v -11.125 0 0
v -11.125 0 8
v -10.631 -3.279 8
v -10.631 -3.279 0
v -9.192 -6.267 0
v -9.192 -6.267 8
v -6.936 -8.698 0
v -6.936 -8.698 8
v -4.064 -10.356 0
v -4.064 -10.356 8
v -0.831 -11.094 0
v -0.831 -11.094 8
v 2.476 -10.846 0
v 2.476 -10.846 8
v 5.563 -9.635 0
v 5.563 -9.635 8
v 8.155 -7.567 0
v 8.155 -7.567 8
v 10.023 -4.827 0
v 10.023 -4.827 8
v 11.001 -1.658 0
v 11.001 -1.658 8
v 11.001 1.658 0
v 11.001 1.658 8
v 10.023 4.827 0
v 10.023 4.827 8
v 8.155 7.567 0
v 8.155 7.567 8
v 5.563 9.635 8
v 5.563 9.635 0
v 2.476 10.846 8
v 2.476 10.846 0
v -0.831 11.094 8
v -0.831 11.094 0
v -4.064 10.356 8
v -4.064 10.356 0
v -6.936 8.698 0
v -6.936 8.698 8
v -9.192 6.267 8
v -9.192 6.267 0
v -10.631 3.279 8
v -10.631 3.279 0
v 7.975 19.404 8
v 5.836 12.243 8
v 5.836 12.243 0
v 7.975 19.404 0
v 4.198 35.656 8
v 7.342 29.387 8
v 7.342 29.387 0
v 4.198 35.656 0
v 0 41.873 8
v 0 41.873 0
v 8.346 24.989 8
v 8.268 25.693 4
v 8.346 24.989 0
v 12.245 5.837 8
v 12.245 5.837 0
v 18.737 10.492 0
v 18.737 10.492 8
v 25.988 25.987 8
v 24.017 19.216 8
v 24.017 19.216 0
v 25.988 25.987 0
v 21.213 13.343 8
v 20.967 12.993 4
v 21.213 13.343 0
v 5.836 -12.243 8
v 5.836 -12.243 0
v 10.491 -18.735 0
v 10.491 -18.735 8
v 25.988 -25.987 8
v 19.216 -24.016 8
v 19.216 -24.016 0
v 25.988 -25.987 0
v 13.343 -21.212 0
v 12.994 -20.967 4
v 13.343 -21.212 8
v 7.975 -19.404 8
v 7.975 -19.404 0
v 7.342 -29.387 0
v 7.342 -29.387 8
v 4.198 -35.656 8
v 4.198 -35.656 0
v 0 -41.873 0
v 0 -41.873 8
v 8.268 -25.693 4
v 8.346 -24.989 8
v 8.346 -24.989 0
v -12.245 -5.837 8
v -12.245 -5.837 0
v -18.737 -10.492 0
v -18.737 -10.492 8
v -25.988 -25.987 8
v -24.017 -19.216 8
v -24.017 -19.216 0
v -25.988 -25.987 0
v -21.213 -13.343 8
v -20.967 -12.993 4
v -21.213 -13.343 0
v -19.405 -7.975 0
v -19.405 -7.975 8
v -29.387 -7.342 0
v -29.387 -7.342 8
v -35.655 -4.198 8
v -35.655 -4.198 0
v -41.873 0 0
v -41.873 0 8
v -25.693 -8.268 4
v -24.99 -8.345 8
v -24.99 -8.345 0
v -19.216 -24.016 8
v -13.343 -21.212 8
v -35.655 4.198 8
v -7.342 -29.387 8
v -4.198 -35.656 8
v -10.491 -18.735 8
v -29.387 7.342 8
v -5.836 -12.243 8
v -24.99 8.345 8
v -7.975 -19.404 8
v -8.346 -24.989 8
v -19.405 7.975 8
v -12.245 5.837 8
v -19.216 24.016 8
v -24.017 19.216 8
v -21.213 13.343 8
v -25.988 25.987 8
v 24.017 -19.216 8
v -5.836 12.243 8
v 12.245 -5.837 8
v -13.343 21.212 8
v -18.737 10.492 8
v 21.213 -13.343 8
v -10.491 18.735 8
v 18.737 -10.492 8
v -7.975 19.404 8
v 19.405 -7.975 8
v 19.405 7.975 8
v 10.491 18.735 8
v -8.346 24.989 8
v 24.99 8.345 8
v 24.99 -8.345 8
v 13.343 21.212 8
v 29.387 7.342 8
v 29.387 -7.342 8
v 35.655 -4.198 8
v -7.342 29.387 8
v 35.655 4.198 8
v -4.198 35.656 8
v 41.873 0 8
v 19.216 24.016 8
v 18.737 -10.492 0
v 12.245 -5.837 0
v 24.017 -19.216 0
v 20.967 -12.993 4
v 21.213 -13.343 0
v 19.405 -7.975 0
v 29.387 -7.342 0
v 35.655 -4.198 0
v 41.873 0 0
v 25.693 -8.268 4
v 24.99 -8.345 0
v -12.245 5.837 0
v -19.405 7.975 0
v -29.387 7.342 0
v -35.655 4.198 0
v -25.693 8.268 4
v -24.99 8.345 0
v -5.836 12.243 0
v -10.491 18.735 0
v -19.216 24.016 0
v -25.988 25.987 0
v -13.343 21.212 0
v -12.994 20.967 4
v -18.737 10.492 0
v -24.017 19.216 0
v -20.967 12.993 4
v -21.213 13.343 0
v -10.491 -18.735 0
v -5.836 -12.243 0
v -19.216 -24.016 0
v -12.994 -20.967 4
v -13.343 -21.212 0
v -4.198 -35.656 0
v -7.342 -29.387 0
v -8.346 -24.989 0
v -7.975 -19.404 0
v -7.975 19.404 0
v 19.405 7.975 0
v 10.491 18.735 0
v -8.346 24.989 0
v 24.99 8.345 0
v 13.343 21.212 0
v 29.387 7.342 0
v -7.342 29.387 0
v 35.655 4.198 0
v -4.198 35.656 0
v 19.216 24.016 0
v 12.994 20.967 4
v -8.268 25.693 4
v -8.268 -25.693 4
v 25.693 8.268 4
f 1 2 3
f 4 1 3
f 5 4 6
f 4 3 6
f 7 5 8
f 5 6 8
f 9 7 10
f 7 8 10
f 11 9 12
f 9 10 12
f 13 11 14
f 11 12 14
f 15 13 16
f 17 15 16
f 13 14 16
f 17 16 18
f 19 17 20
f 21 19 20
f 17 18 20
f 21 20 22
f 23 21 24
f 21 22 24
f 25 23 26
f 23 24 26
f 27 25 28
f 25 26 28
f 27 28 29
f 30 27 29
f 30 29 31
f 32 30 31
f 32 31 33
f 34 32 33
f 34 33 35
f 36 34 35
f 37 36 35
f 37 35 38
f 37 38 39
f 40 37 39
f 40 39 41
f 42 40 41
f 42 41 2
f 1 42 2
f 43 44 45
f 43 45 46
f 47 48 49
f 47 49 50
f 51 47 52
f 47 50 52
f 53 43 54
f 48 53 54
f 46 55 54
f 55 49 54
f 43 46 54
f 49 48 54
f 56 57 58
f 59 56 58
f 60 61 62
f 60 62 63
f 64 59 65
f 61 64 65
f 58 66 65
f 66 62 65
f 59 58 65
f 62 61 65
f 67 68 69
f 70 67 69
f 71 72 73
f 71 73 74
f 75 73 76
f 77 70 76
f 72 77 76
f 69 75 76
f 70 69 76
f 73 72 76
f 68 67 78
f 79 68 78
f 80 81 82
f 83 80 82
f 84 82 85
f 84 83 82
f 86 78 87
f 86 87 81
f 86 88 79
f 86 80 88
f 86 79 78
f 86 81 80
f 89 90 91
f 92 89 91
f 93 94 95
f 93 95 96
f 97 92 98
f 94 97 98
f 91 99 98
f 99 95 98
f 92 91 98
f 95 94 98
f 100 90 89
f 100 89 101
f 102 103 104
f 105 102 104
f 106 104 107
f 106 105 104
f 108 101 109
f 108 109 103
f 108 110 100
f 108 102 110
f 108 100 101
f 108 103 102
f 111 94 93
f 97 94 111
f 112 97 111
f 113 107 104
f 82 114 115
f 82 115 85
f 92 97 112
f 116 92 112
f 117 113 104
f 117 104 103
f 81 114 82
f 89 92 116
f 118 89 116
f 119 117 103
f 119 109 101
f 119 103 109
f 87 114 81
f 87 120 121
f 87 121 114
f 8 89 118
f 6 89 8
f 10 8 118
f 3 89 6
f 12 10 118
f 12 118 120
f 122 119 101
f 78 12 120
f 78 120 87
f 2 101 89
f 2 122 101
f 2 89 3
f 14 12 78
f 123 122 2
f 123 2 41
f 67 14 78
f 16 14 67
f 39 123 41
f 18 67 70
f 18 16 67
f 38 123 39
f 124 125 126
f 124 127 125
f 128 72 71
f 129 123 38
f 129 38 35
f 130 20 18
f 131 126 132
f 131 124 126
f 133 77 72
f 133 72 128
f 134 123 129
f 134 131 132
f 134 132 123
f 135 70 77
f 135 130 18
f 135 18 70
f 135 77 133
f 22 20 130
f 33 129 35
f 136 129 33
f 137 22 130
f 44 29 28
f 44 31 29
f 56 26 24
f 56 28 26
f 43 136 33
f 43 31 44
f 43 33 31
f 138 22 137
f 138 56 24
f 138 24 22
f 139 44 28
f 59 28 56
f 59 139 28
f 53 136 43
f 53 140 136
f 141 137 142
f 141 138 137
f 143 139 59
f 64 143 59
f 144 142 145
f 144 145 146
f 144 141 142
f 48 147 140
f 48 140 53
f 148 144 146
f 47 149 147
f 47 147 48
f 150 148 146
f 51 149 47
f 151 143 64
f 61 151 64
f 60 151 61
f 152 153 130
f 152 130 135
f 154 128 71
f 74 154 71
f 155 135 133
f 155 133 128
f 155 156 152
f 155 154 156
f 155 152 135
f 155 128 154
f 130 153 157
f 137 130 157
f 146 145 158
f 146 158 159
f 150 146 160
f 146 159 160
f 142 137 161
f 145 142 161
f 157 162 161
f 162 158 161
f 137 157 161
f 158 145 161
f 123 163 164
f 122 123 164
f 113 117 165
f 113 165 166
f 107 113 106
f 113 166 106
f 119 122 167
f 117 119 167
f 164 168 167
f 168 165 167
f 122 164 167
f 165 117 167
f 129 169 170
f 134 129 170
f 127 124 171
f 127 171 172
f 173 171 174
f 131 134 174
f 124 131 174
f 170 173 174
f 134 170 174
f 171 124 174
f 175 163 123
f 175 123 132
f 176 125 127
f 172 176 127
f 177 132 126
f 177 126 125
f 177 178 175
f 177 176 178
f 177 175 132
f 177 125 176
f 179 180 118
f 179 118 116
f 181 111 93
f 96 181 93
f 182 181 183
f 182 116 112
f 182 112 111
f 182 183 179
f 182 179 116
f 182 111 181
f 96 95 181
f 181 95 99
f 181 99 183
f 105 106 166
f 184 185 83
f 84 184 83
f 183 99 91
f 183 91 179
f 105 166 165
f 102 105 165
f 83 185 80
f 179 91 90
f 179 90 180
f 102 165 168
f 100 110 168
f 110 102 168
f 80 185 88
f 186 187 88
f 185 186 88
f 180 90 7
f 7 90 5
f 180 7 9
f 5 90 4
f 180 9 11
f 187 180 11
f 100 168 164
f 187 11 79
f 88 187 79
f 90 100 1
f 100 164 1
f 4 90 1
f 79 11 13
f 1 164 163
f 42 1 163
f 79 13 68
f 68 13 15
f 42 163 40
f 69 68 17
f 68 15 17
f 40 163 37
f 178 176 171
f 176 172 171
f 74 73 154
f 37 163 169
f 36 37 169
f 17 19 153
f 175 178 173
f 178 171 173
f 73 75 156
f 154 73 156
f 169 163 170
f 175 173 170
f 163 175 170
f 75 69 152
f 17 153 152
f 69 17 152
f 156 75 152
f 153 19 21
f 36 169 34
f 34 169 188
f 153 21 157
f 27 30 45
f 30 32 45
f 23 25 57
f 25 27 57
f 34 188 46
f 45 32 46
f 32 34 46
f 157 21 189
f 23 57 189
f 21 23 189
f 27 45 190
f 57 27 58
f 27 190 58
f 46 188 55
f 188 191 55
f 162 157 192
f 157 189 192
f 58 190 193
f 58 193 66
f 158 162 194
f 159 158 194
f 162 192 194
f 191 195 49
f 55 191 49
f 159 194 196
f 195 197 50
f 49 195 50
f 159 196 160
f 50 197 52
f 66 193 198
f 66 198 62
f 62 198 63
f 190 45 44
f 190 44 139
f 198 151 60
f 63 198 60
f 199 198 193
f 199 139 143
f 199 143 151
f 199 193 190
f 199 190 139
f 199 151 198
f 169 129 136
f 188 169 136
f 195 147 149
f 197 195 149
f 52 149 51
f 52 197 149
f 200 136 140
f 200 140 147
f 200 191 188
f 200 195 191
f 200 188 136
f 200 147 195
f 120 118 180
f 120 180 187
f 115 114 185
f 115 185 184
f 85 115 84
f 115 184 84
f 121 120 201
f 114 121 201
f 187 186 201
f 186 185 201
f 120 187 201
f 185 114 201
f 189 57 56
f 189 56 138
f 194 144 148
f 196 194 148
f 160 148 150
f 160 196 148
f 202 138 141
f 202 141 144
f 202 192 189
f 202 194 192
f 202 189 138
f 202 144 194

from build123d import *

# Parameters (mm, degrees)
F1_DEPTH = 8
F3_D     = 22.25


with BuildPart() as f1:
    # F0 (on Top) → F1 (new body)
    with BuildSketch(Plane.XY):
        with BuildLine():
            ThreePointArc((9.9471375726, 4.9819754226), (7.8665088435, 7.8666170375), (4.9818386126, 9.9472060921))
            ThreePointArc((4.9818386126, 9.9472060921), (0, 11.125), (-4.9818386126, 9.9472060921))
            ThreePointArc((-4.9818386126, 9.9472060921), (-7.8665088435, 7.8666170375), (-9.9471375726, 4.9819754226))
            ThreePointArc((-9.9471375726, 4.9819754226), (-11.125, 0), (-9.9471375726, -4.9819754226))
            ThreePointArc((-9.9471375726, -4.9819754226), (-7.8665088435, -7.8666170375), (-4.9818386126, -9.9472060921))
            ThreePointArc((-4.9818386126, -9.9472060921), (0, -11.125), (4.9818386126, -9.9472060921))
            ThreePointArc((4.9818386126, -9.9472060921), (7.8665088435, -7.8666170375), (9.9471375726, -4.9819754226))
            ThreePointArc((9.9471375726, -4.9819754226), (10.8265306192, -2.5596600853), (11.125, 0))
            ThreePointArc((11.125, 0), (10.8265306192, 2.5596600853), (9.9471375726, 4.9819754226))
        make_face()
        with BuildLine():
            add(Edge.make_bspline(
                [(4.9818386126, 9.9472060921), (5.2692870464, 10.7123686961), (5.5568645372, 11.4776931218), (5.8364125218, 12.242766493)],
                knots=[0, 0, 0, 0, 0.0701678859, 0.0701678859, 0.0701678859, 0.0701678859], degree=3))
            ThreePointArc((4.9818386126, 9.9472060921), (7.8665088435, 7.8666170375), (9.9471375726, 4.9819754226))
            add(Edge.make_bspline(
                [(9.9471375726, 4.9819754226), (10.7123016854, 5.2694244447), (11.4776275551, 5.5570012299), (12.2427023029, 5.8365471685)],
                knots=[1.11321e-05, 1.11321e-05, 1.11321e-05, 1.11321e-05, 0.0701791516, 0.0701791516, 0.0701791516, 0.0701791516], degree=3))
            ThreePointArc((12.2427023029, 5.8365471685), (9.5902820459, 9.5903875212), (5.8364125218, 12.242766493))
        make_face()
        with BuildLine():
            ThreePointArc((-4.9818386126, 9.9472060921), (0, 11.125), (4.9818386126, 9.9472060921))
            add(Edge.make_bspline(
                [(4.9818386126, 9.9472060921), (5.2692870464, 10.7123686961), (5.5568645372, 11.4776931218), (5.8364125218, 12.242766493)],
                knots=[0, 0, 0, 0, 0.0701678859, 0.0701678859, 0.0701678859, 0.0701678859], degree=3))
            ThreePointArc((5.8364125218, 12.242766493), (0, 13.5627815188), (-5.8364125218, 12.242766493))
            add(Edge.make_bspline(
                [(-4.9818386126, 9.9472060921), (-5.2692870464, 10.7123686961), (-5.5568645372, 11.4776931218), (-5.8364125218, 12.242766493)],
                knots=[0, 0, 0, 0, 0.0701678859, 0.0701678859, 0.0701678859, 0.0701678859], degree=3))
        make_face()
        with BuildLine():
            ThreePointArc((-9.9471375726, 4.9819754226), (-7.8665088435, 7.8666170375), (-4.9818386126, 9.9472060921))
            add(Edge.make_bspline(
                [(-4.9818386126, 9.9472060921), (-5.2692870464, 10.7123686961), (-5.5568645372, 11.4776931218), (-5.8364125218, 12.242766493)],
                knots=[0, 0, 0, 0, 0.0701678859, 0.0701678859, 0.0701678859, 0.0701678859], degree=3))
            ThreePointArc((-5.8364125218, 12.242766493), (-9.5902820459, 9.5903875212), (-12.2427023029, 5.8365471685))
            add(Edge.make_bspline(
                [(-9.9471375726, 4.9819754226), (-10.7123016854, 5.2694244447), (-11.4776275551, 5.5570012299), (-12.2427023029, 5.8365471685)],
                knots=[1.11321e-05, 1.11321e-05, 1.11321e-05, 1.11321e-05, 0.0701791516, 0.0701791516, 0.0701791516, 0.0701791516], degree=3))
        make_face()
        with BuildLine():
            add(Edge.make_bspline(
                [(9.9471375726, 4.9819754226), (10.7123016854, 5.2694244447), (11.4776275551, 5.5570012299), (12.2427023029, 5.8365471685)],
                knots=[1.11321e-05, 1.11321e-05, 1.11321e-05, 1.11321e-05, 0.0701791516, 0.0701791516, 0.0701791516, 0.0701791516], degree=3))
            ThreePointArc((9.9471375726, 4.9819754226), (10.8265306192, 2.5596600853), (11.125, 0))
            ThreePointArc((11.125, 0), (10.8265306192, -2.5596600853), (9.9471375726, -4.9819754226))
            add(Edge.make_bspline(
                [(9.9471375726, -4.9819754226), (10.7123016854, -5.2694244447), (11.4776275551, -5.5570012299), (12.2427023029, -5.8365471685)],
                knots=[1.11321e-05, 1.11321e-05, 1.11321e-05, 1.11321e-05, 0.0701791516, 0.0701791516, 0.0701791516, 0.0701791516], degree=3))
            ThreePointArc((12.2427023029, -5.8365471685), (12.2428068623, -5.8363278403), (12.2429114178, -5.8361085102))
            ThreePointArc((12.2429114178, -5.8361085102), (13.2286993926, -2.9917478013), (13.5627815188, 0))
            ThreePointArc((13.5627815188, 0), (13.2286993926, 2.9917478013), (12.2429114178, 5.8361085102))
            ThreePointArc((12.2429114178, 5.8361085102), (12.2428068623, 5.8363278403), (12.2427023029, 5.8365471685))
        make_face()
        with BuildLine():
            ThreePointArc((-5.8364125218, 12.242766493), (0, 13.5627815188), (5.8364125218, 12.242766493))
            add(Edge.make_bspline(
                [(5.8364125218, 12.242766493), (7.4881688325, 16.7633312564), (10.5639067692, 26.8820696151), (3.7644701713, 36.5283294837), (0, 41.8734326959)],
                knots=[0.0701678859, 0.0701678859, 0.0701678859, 0.0701678859, 0.484766648, 1, 1, 1, 1], degree=3))
            add(Edge.make_bspline(
                [(-5.8364125218, 12.242766493), (-7.4881688325, 16.7633312564), (-10.5639067692, 26.8820696151), (-3.7644701713, 36.5283294837), (0, 41.8734326959)],
                knots=[0.0701678859, 0.0701678859, 0.0701678859, 0.0701678859, 0.484766648, 1, 1, 1, 1], degree=3))
        make_face()
        Polygon((2.4637663324, 30.8732958237), (5.4101836661, 26.3272686725), (2.9464173337, 21.5025828357), (-2.4637663324, 21.2239241501), (-5.4101836661, 25.7699513014), (-2.9464173337, 30.5946371381), align=None, mode=Mode.SUBTRACT)
        with BuildLine():
            add(Edge.make_bspline(
                [(5.8364125218, 12.242766493), (7.8640126159, 15.4827332927), (12.1444054008, 22.3225093182), (21.2142960732, 24.7235177216), (25.987826083, 25.9871807669)],
                knots=[0, 0, 0, 0, 0.4736948677, 1, 1, 1, 1], degree=3))
            ThreePointArc((5.8364125218, 12.242766493), (9.5902820459, 9.5903875212), (12.2427023029, 5.8365471685))
            add(Edge.make_bspline(
                [(12.2427023029, 5.8365471685), (12.2434313303, 5.8368135433), (12.2441603575, 5.8370799108), (12.2448893845, 5.8373462711)],
                knots=[0.0701791516, 0.0701791516, 0.0701791516, 0.0701791516, 0.0702460136, 0.0702460136, 0.0702460136, 0.0702460136], degree=3))
            add(Edge.make_bspline(
                [(12.2448893845, 5.8373462711), (15.4842471687, 7.8644533679), (22.3230423426, 12.1447253647), (24.7240445028, 21.2136821375), (25.987826083, 25.9871807669)],
                knots=[9.63938e-05, 9.63938e-05, 9.63938e-05, 9.63938e-05, 0.4736948677, 1, 1, 1, 1], degree=3))
        make_face()
        with BuildLine():
            ThreePointArc((-9.9471375726, -4.9819754226), (-11.125, 0), (-9.9471375726, 4.9819754226))
            add(Edge.make_bspline(
                [(-9.9471375726, 4.9819754226), (-10.7123016854, 5.2694244447), (-11.4776275551, 5.5570012299), (-12.2427023029, 5.8365471685)],
                knots=[1.11321e-05, 1.11321e-05, 1.11321e-05, 1.11321e-05, 0.0701791516, 0.0701791516, 0.0701791516, 0.0701791516], degree=3))
            ThreePointArc((-12.2427023029, 5.8365471685), (-12.2428068623, 5.8363278403), (-12.2429114178, 5.8361085102))
            ThreePointArc((-12.2429114178, 5.8361085102), (-13.5627815188, 0), (-12.2429114178, -5.8361085102))
            ThreePointArc((-12.2429114178, -5.8361085102), (-12.2428068623, -5.8363278403), (-12.2427023029, -5.8365471685))
            add(Edge.make_bspline(
                [(-9.9471375726, -4.9819754226), (-10.7123016854, -5.2694244447), (-11.4776275551, -5.5570012299), (-12.2427023029, -5.8365471685)],
                knots=[1.11321e-05, 1.11321e-05, 1.11321e-05, 1.11321e-05, 0.0701791516, 0.0701791516, 0.0701791516, 0.0701791516], degree=3))
        make_face()
        with BuildLine():
            ThreePointArc((-12.2427023029, 5.8365471685), (-9.5902820459, 9.5903875212), (-5.8364125218, 12.242766493))
            add(Edge.make_bspline(
                [(-5.8364125218, 12.242766493), (-7.8640126159, 15.4827332927), (-12.1444054008, 22.3225093182), (-21.2142960732, 24.7235177216), (-25.987826083, 25.9871807669)],
                knots=[0, 0, 0, 0, 0.4736948677, 1, 1, 1, 1], degree=3))
            add(Edge.make_bspline(
                [(-12.2448893845, 5.8373462711), (-15.4842471687, 7.8644533679), (-22.3230423426, 12.1447253647), (-24.7240445028, 21.2136821375), (-25.987826083, 25.9871807669)],
                knots=[9.63938e-05, 9.63938e-05, 9.63938e-05, 9.63938e-05, 0.4736948677, 1, 1, 1, 1], degree=3))
            add(Edge.make_bspline(
                [(-12.2427023029, 5.8365471685), (-12.2434313303, 5.8368135433), (-12.2441603575, 5.8370799108), (-12.2448893845, 5.8373462711)],
                knots=[0.0701791516, 0.0701791516, 0.0701791516, 0.0701791516, 0.0702460136, 0.0702460136, 0.0702460136, 0.0702460136], degree=3))
        make_face()
        with BuildLine():
            add(Edge.make_bspline(
                [(12.2427023029, 5.8365471685), (12.2434313303, 5.8368135433), (12.2441603575, 5.8370799108), (12.2448893845, 5.8373462711)],
                knots=[0.0701791516, 0.0701791516, 0.0701791516, 0.0701791516, 0.0702460136, 0.0702460136, 0.0702460136, 0.0702460136], degree=3))
            ThreePointArc((12.2427023029, 5.8365471685), (12.2428068623, 5.8363278403), (12.2429114178, 5.8361085102))
            add(Edge.make_bspline(
                [(12.2429114178, 5.8361085102), (12.24357074, 5.8365210972), (12.2442300623, 5.8369336841), (12.2448893845, 5.8373462711)],
                knots=[0, 0, 0, 0, 9.63938e-05, 9.63938e-05, 9.63938e-05, 9.63938e-05], degree=3))
        make_face()
        with BuildLine():
            ThreePointArc((-4.9818386126, -9.9472060921), (-7.8665088435, -7.8666170375), (-9.9471375726, -4.9819754226))
            add(Edge.make_bspline(
                [(-9.9471375726, -4.9819754226), (-10.7123016854, -5.2694244447), (-11.4776275551, -5.5570012299), (-12.2427023029, -5.8365471685)],
                knots=[1.11321e-05, 1.11321e-05, 1.11321e-05, 1.11321e-05, 0.0701791516, 0.0701791516, 0.0701791516, 0.0701791516], degree=3))
            ThreePointArc((-12.2427023029, -5.8365471685), (-9.5902820459, -9.5903875212), (-5.8364125218, -12.242766493))
            add(Edge.make_bspline(
                [(-4.9818386126, -9.9472060921), (-5.2692870464, -10.7123686961), (-5.5568645372, -11.4776931218), (-5.8364125218, -12.242766493)],
                knots=[0, 0, 0, 0, 0.0701678859, 0.0701678859, 0.0701678859, 0.0701678859], degree=3))
        make_face()
        with BuildLine():
            ThreePointArc((-12.2429114178, 5.8361085102), (-12.2428068623, 5.8363278403), (-12.2427023029, 5.8365471685))
            add(Edge.make_bspline(
                [(-12.2427023029, 5.8365471685), (-12.2434313303, 5.8368135433), (-12.2441603575, 5.8370799108), (-12.2448893845, 5.8373462711)],
                knots=[0.0701791516, 0.0701791516, 0.0701791516, 0.0701791516, 0.0702460136, 0.0702460136, 0.0702460136, 0.0702460136], degree=3))
            add(Edge.make_bspline(
                [(-12.2429114178, 5.8361085102), (-12.24357074, 5.8365210972), (-12.2442300623, 5.8369336841), (-12.2448893845, 5.8373462711)],
                knots=[0, 0, 0, 0, 9.63938e-05, 9.63938e-05, 9.63938e-05, 9.63938e-05], degree=3))
        make_face()
        with BuildLine():
            add(Edge.make_bspline(
                [(9.9471375726, -4.9819754226), (10.7123016854, -5.2694244447), (11.4776275551, -5.5570012299), (12.2427023029, -5.8365471685)],
                knots=[1.11321e-05, 1.11321e-05, 1.11321e-05, 1.11321e-05, 0.0701791516, 0.0701791516, 0.0701791516, 0.0701791516], degree=3))
            ThreePointArc((9.9471375726, -4.9819754226), (7.8665088435, -7.8666170375), (4.9818386126, -9.9472060921))
            add(Edge.make_bspline(
                [(4.9818386126, -9.9472060921), (5.2692870464, -10.7123686961), (5.5568645372, -11.4776931218), (5.8364125218, -12.242766493)],
                knots=[0, 0, 0, 0, 0.0701678859, 0.0701678859, 0.0701678859, 0.0701678859], degree=3))
            ThreePointArc((5.8364125218, -12.242766493), (9.5902820459, -9.5903875212), (12.2427023029, -5.8365471685))
        make_face()
        with BuildLine():
            add(Edge.make_bspline(
                [(12.2448893845, 5.8373462711), (16.7645989794, 7.4886856309), (26.8824474311, 10.5633354573), (36.5278967878, 3.7644701713), (41.873, 0)],
                knots=[0.0702460136, 0.0702460136, 0.0702460136, 0.0702460136, 0.484766648, 1, 1, 1, 1], degree=3))
            add(Edge.make_bspline(
                [(12.2429114178, 5.8361085102), (12.24357074, 5.8365210972), (12.2442300623, 5.8369336841), (12.2448893845, 5.8373462711)],
                knots=[0, 0, 0, 0, 9.63938e-05, 9.63938e-05, 9.63938e-05, 9.63938e-05], degree=3))
            ThreePointArc((12.2429114178, 5.8361085102), (13.2286993926, 2.9917478013), (13.5627815188, 0))
            ThreePointArc((13.5627815188, 0), (13.2286993926, -2.9917478013), (12.2429114178, -5.8361085102))
            add(Edge.make_bspline(
                [(12.2429114178, -5.8361085102), (12.24357074, -5.8365210972), (12.2442300623, -5.8369336841), (12.2448893845, -5.8373462711)],
                knots=[0, 0, 0, 0, 9.63938e-05, 9.63938e-05, 9.63938e-05, 9.63938e-05], degree=3))
            add(Edge.make_bspline(
                [(12.2448893845, -5.8373462711), (16.7645989794, -7.4886856309), (26.8824474311, -10.5633354573), (36.5278967878, -3.7644701713), (41.873, 0)],
                knots=[0.0702460136, 0.0702460136, 0.0702460136, 0.0702460136, 0.484766648, 1, 1, 1, 1], degree=3))
        make_face()
        Polygon((25.7699513014, 5.4101836661), (30.5946371381, 2.9464173337), (30.8732958237, -2.4637663324), (26.3272686725, -5.4101836661), (21.5025828357, -2.9464173337), (21.2239241501, 2.4637663324), align=None, mode=Mode.SUBTRACT)
        with BuildLine():
            ThreePointArc((4.9818386126, -9.9472060921), (0, -11.125), (-4.9818386126, -9.9472060921))
            add(Edge.make_bspline(
                [(-4.9818386126, -9.9472060921), (-5.2692870464, -10.7123686961), (-5.5568645372, -11.4776931218), (-5.8364125218, -12.242766493)],
                knots=[0, 0, 0, 0, 0.0701678859, 0.0701678859, 0.0701678859, 0.0701678859], degree=3))
            ThreePointArc((-5.8364125218, -12.242766493), (0, -13.5627815188), (5.8364125218, -12.242766493))
            add(Edge.make_bspline(
                [(4.9818386126, -9.9472060921), (5.2692870464, -10.7123686961), (5.5568645372, -11.4776931218), (5.8364125218, -12.242766493)],
                knots=[0, 0, 0, 0, 0.0701678859, 0.0701678859, 0.0701678859, 0.0701678859], degree=3))
        make_face()
        with BuildLine():
            ThreePointArc((-5.8364125218, -12.242766493), (-9.5902820459, -9.5903875212), (-12.2427023029, -5.8365471685))
            add(Edge.make_bspline(
                [(-12.2427023029, -5.8365471685), (-12.2434313303, -5.8368135433), (-12.2441603575, -5.8370799108), (-12.2448893845, -5.8373462711)],
                knots=[0.0701791516, 0.0701791516, 0.0701791516, 0.0701791516, 0.0702460136, 0.0702460136, 0.0702460136, 0.0702460136], degree=3))
            add(Edge.make_bspline(
                [(-12.2448893845, -5.8373462711), (-15.4842471687, -7.8644533679), (-22.3230423426, -12.1447253647), (-24.7240445028, -21.2136821375), (-25.987826083, -25.9871807669)],
                knots=[9.63938e-05, 9.63938e-05, 9.63938e-05, 9.63938e-05, 0.4736948677, 1, 1, 1, 1], degree=3))
            add(Edge.make_bspline(
                [(-5.8364125218, -12.242766493), (-7.8640126159, -15.4827332927), (-12.1444054008, -22.3225093182), (-21.2142960732, -24.7235177216), (-25.987826083, -25.9871807669)],
                knots=[0, 0, 0, 0, 0.4736948677, 1, 1, 1, 1], degree=3))
        make_face()
        with BuildLine():
            add(Edge.make_bspline(
                [(-12.2427023029, -5.8365471685), (-12.2434313303, -5.8368135433), (-12.2441603575, -5.8370799108), (-12.2448893845, -5.8373462711)],
                knots=[0.0701791516, 0.0701791516, 0.0701791516, 0.0701791516, 0.0702460136, 0.0702460136, 0.0702460136, 0.0702460136], degree=3))
            ThreePointArc((-12.2427023029, -5.8365471685), (-12.2428068623, -5.8363278403), (-12.2429114178, -5.8361085102))
            add(Edge.make_bspline(
                [(-12.2429114178, -5.8361085102), (-12.24357074, -5.8365210972), (-12.2442300623, -5.8369336841), (-12.2448893845, -5.8373462711)],
                knots=[0, 0, 0, 0, 9.63938e-05, 9.63938e-05, 9.63938e-05, 9.63938e-05], degree=3))
        make_face()
        with BuildLine():
            add(Edge.make_bspline(
                [(-12.2429114178, 5.8361085102), (-12.24357074, 5.8365210972), (-12.2442300623, 5.8369336841), (-12.2448893845, 5.8373462711)],
                knots=[0, 0, 0, 0, 9.63938e-05, 9.63938e-05, 9.63938e-05, 9.63938e-05], degree=3))
            add(Edge.make_bspline(
                [(-12.2448893845, 5.8373462711), (-16.7645989794, 7.4886856309), (-26.8824474311, 10.5633354573), (-36.5278967878, 3.7644701713), (-41.873, 0)],
                knots=[0.0702460136, 0.0702460136, 0.0702460136, 0.0702460136, 0.484766648, 1, 1, 1, 1], degree=3))
            add(Edge.make_bspline(
                [(-12.2448893845, -5.8373462711), (-16.7645989794, -7.4886856309), (-26.8824474311, -10.5633354573), (-36.5278967878, -3.7644701713), (-41.873, 0)],
                knots=[0.0702460136, 0.0702460136, 0.0702460136, 0.0702460136, 0.484766648, 1, 1, 1, 1], degree=3))
            add(Edge.make_bspline(
                [(-12.2429114178, -5.8361085102), (-12.24357074, -5.8365210972), (-12.2442300623, -5.8369336841), (-12.2448893845, -5.8373462711)],
                knots=[0, 0, 0, 0, 9.63938e-05, 9.63938e-05, 9.63938e-05, 9.63938e-05], degree=3))
            ThreePointArc((-12.2429114178, -5.8361085102), (-13.5627815188, 0), (-12.2429114178, 5.8361085102))
        make_face()
        Polygon((-25.7699513014, -5.4101836661), (-30.5946371381, -2.9464173337), (-30.8732958237, 2.4637663324), (-26.3272686725, 5.4101836661), (-21.5025828357, 2.9464173337), (-21.2239241501, -2.4637663324), align=None, mode=Mode.SUBTRACT)
        with BuildLine():
            ThreePointArc((12.2429114178, -5.8361085102), (12.2428068623, -5.8363278403), (12.2427023029, -5.8365471685))
            add(Edge.make_bspline(
                [(12.2427023029, -5.8365471685), (12.2434313303, -5.8368135433), (12.2441603575, -5.8370799108), (12.2448893845, -5.8373462711)],
                knots=[0.0701791516, 0.0701791516, 0.0701791516, 0.0701791516, 0.0702460136, 0.0702460136, 0.0702460136, 0.0702460136], degree=3))
            add(Edge.make_bspline(
                [(12.2429114178, -5.8361085102), (12.24357074, -5.8365210972), (12.2442300623, -5.8369336841), (12.2448893845, -5.8373462711)],
                knots=[0, 0, 0, 0, 9.63938e-05, 9.63938e-05, 9.63938e-05, 9.63938e-05], degree=3))
        make_face()
        with BuildLine():
            add(Edge.make_bspline(
                [(12.2427023029, -5.8365471685), (12.2434313303, -5.8368135433), (12.2441603575, -5.8370799108), (12.2448893845, -5.8373462711)],
                knots=[0.0701791516, 0.0701791516, 0.0701791516, 0.0701791516, 0.0702460136, 0.0702460136, 0.0702460136, 0.0702460136], degree=3))
            ThreePointArc((12.2427023029, -5.8365471685), (9.5902820459, -9.5903875212), (5.8364125218, -12.242766493))
            add(Edge.make_bspline(
                [(5.8364125218, -12.242766493), (7.8640126159, -15.4827332927), (12.1444054008, -22.3225093182), (21.2142960732, -24.7235177216), (25.987826083, -25.9871807669)],
                knots=[0, 0, 0, 0, 0.4736948677, 1, 1, 1, 1], degree=3))
            add(Edge.make_bspline(
                [(12.2448893845, -5.8373462711), (15.4842471687, -7.8644533679), (22.3230423426, -12.1447253647), (24.7240445028, -21.2136821375), (25.987826083, -25.9871807669)],
                knots=[9.63938e-05, 9.63938e-05, 9.63938e-05, 9.63938e-05, 0.4736948677, 1, 1, 1, 1], degree=3))
        make_face()
        with BuildLine():
            ThreePointArc((5.8364125218, -12.242766493), (0, -13.5627815188), (-5.8364125218, -12.242766493))
            add(Edge.make_bspline(
                [(-5.8364125218, -12.242766493), (-7.4881688325, -16.7633312564), (-10.5639067692, -26.8820696151), (-3.7644701713, -36.5283294837), (0, -41.8734326959)],
                knots=[0.0701678859, 0.0701678859, 0.0701678859, 0.0701678859, 0.484766648, 1, 1, 1, 1], degree=3))
            add(Edge.make_bspline(
                [(5.8364125218, -12.242766493), (7.4881688325, -16.7633312564), (10.5639067692, -26.8820696151), (3.7644701713, -36.5283294837), (0, -41.8734326959)],
                knots=[0.0701678859, 0.0701678859, 0.0701678859, 0.0701678859, 0.484766648, 1, 1, 1, 1], degree=3))
        make_face()
        Polygon((5.4101836661, -25.7699513014), (2.9464173337, -30.5946371381), (-2.4637663324, -30.8732958237), (-5.4101836661, -26.3272686725), (-2.9464173337, -21.5025828357), (2.4637663324, -21.2239241501), align=None, mode=Mode.SUBTRACT)
        Polygon((2.9464173337, 21.5025828357), (5.4101836661, 26.3272686725), (2.4637663324, 30.8732958237), (-2.9464173337, 30.5946371381), (-5.4101836661, 25.7699513014), (-2.4637663324, 21.2239241501), align=None)
        Polygon((-30.8732958237, 2.4637663324), (-30.5946371381, -2.9464173337), (-25.7699513014, -5.4101836661), (-21.2239241501, -2.4637663324), (-21.5025828357, 2.9464173337), (-26.3272686725, 5.4101836661), align=None)
        Polygon((-2.4637663324, -30.8732958237), (2.9464173337, -30.5946371381), (5.4101836661, -25.7699513014), (2.4637663324, -21.2239241501), (-2.9464173337, -21.5025828357), (-5.4101836661, -26.3272686725), align=None)
        Polygon((30.8732958237, -2.4637663324), (30.5946371381, 2.9464173337), (25.7699513014, 5.4101836661), (21.2239241501, 2.4637663324), (21.5025828357, -2.9464173337), (26.3272686725, -5.4101836661), align=None)
    extrude(amount=F1_DEPTH)

    # F3 (through all)
    with Locations(Plane(origin=(0, 0, 0), x_dir=(1, 0, 0), z_dir=(0, 0, -1))):
        with Locations((0, 0)):
            Hole(F3_D / 2)


solid = f1.part
